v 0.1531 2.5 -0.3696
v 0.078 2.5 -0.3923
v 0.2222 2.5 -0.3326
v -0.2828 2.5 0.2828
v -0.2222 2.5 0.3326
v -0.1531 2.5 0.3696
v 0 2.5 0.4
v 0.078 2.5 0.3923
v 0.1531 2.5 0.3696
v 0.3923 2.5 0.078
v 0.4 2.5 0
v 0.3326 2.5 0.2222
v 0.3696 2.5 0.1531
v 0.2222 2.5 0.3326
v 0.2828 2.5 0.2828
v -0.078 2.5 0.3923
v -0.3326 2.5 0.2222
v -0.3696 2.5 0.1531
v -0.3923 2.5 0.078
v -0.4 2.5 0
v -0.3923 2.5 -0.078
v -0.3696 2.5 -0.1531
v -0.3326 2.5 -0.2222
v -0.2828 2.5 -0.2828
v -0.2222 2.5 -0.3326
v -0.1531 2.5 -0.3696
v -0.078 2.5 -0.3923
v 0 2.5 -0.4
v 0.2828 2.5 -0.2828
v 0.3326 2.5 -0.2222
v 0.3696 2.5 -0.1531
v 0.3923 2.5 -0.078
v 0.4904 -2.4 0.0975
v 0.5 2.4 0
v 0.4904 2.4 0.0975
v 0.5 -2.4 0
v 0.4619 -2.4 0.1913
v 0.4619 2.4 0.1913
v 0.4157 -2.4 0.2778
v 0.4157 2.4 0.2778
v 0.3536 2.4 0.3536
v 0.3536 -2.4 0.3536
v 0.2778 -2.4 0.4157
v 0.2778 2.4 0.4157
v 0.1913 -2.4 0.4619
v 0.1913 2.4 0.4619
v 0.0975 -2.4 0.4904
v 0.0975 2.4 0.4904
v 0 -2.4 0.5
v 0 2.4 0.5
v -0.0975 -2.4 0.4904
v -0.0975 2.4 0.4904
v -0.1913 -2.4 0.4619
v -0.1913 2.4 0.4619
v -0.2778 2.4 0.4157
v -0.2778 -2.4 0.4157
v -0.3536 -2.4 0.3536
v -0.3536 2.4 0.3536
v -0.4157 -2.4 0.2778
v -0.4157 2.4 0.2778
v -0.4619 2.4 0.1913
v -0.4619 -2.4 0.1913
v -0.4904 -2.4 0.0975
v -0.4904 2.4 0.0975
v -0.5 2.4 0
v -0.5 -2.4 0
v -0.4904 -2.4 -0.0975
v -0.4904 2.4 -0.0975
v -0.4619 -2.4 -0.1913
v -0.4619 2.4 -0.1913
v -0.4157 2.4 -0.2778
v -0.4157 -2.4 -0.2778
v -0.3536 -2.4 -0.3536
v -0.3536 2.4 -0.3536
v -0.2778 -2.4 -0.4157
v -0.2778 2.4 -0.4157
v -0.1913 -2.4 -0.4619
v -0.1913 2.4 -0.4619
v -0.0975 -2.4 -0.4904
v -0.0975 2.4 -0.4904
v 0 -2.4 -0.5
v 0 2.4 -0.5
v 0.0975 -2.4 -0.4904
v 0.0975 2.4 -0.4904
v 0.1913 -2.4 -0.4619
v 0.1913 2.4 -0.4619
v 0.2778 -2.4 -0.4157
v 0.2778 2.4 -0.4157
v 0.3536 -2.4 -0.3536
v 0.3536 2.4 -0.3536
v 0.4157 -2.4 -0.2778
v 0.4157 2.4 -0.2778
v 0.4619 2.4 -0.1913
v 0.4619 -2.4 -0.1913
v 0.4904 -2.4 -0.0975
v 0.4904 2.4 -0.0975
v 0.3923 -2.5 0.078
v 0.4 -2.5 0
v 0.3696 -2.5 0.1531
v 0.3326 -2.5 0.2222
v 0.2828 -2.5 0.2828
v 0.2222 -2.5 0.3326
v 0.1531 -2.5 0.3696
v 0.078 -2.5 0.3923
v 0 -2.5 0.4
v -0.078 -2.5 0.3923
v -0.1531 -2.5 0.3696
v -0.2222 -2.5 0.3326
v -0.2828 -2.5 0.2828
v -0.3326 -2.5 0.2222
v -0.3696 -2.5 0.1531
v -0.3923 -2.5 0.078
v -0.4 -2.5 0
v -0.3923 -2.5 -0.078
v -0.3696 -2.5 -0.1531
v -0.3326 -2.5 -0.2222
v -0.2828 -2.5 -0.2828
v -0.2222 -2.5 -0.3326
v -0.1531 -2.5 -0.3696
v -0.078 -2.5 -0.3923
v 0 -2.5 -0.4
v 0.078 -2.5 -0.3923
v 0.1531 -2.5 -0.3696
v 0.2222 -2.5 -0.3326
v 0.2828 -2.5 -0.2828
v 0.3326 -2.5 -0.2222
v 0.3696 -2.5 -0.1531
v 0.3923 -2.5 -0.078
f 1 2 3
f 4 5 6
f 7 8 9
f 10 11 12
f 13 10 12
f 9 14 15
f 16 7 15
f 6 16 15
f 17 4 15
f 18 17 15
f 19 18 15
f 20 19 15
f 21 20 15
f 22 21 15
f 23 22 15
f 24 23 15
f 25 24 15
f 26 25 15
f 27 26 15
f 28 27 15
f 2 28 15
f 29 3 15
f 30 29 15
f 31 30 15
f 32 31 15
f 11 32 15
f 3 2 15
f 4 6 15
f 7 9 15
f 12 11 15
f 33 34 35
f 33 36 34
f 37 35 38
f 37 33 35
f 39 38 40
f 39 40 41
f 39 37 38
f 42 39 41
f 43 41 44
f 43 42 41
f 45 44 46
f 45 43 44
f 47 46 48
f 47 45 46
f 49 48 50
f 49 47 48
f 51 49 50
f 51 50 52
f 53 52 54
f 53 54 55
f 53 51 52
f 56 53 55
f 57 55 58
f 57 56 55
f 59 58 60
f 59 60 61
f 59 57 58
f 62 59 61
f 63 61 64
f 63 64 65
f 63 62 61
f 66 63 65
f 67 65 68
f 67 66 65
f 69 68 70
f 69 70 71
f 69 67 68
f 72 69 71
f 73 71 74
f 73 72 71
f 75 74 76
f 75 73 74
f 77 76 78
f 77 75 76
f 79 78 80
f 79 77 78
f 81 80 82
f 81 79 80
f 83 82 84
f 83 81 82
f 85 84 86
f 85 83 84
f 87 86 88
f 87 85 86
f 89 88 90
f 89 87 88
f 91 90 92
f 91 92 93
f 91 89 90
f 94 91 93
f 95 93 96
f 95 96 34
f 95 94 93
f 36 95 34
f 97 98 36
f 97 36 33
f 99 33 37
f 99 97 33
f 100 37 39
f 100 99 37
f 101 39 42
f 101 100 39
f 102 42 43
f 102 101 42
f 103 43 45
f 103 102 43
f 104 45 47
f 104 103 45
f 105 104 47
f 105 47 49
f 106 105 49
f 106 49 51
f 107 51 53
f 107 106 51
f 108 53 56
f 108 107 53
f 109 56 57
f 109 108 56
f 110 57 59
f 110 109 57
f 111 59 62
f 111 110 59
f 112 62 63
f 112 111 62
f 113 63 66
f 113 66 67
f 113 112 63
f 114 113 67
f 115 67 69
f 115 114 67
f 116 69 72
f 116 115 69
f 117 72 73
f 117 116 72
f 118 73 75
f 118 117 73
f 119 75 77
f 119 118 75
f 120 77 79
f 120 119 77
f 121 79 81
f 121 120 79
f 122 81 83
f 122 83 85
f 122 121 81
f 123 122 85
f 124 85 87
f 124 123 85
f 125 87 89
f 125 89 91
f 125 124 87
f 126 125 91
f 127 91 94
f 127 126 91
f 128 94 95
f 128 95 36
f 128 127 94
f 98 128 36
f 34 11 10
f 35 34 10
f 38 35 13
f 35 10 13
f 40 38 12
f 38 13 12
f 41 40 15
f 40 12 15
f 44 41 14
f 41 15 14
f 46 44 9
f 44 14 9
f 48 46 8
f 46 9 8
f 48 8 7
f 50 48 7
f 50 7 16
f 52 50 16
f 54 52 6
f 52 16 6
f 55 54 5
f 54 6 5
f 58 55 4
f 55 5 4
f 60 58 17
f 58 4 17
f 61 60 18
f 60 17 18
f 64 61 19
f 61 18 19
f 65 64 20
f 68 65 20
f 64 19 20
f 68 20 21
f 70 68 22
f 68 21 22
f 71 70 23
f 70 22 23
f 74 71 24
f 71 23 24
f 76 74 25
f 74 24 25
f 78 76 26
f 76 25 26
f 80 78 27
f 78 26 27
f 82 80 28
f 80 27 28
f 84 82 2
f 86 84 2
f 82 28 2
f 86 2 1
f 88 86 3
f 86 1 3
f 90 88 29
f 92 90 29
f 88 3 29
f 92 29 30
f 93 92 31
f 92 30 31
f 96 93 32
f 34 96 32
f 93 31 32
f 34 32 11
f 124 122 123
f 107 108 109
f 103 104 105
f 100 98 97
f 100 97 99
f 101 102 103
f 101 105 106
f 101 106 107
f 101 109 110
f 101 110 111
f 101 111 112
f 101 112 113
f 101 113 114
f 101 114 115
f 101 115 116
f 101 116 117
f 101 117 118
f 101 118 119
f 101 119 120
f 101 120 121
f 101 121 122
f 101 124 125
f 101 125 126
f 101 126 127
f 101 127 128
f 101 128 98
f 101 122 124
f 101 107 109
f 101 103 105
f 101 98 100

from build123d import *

# Parameters (mm, degrees)
F0_R     = 0.5
F1_DEPTH = 2.5
F2_SIZE  = 0.1


with BuildPart() as f1:
    # F0 (on Front) → F1 (new body)
    with BuildSketch(Plane.XZ):
        Circle(F0_R)
    extrude(amount=F1_DEPTH)

    # F2
    f2_edges = [f1.edges().sort_by_distance(p)[0] for p in [
        (-0.5, -2.5, 0),
    ]]
    chamfer(f2_edges, length=F2_SIZE)

    # F3: F1 across plane


with BuildPart() as f1_1:
    add(f1.part)
    add(f1.part.mirror(Plane.XZ))


solid = f1_1.part
